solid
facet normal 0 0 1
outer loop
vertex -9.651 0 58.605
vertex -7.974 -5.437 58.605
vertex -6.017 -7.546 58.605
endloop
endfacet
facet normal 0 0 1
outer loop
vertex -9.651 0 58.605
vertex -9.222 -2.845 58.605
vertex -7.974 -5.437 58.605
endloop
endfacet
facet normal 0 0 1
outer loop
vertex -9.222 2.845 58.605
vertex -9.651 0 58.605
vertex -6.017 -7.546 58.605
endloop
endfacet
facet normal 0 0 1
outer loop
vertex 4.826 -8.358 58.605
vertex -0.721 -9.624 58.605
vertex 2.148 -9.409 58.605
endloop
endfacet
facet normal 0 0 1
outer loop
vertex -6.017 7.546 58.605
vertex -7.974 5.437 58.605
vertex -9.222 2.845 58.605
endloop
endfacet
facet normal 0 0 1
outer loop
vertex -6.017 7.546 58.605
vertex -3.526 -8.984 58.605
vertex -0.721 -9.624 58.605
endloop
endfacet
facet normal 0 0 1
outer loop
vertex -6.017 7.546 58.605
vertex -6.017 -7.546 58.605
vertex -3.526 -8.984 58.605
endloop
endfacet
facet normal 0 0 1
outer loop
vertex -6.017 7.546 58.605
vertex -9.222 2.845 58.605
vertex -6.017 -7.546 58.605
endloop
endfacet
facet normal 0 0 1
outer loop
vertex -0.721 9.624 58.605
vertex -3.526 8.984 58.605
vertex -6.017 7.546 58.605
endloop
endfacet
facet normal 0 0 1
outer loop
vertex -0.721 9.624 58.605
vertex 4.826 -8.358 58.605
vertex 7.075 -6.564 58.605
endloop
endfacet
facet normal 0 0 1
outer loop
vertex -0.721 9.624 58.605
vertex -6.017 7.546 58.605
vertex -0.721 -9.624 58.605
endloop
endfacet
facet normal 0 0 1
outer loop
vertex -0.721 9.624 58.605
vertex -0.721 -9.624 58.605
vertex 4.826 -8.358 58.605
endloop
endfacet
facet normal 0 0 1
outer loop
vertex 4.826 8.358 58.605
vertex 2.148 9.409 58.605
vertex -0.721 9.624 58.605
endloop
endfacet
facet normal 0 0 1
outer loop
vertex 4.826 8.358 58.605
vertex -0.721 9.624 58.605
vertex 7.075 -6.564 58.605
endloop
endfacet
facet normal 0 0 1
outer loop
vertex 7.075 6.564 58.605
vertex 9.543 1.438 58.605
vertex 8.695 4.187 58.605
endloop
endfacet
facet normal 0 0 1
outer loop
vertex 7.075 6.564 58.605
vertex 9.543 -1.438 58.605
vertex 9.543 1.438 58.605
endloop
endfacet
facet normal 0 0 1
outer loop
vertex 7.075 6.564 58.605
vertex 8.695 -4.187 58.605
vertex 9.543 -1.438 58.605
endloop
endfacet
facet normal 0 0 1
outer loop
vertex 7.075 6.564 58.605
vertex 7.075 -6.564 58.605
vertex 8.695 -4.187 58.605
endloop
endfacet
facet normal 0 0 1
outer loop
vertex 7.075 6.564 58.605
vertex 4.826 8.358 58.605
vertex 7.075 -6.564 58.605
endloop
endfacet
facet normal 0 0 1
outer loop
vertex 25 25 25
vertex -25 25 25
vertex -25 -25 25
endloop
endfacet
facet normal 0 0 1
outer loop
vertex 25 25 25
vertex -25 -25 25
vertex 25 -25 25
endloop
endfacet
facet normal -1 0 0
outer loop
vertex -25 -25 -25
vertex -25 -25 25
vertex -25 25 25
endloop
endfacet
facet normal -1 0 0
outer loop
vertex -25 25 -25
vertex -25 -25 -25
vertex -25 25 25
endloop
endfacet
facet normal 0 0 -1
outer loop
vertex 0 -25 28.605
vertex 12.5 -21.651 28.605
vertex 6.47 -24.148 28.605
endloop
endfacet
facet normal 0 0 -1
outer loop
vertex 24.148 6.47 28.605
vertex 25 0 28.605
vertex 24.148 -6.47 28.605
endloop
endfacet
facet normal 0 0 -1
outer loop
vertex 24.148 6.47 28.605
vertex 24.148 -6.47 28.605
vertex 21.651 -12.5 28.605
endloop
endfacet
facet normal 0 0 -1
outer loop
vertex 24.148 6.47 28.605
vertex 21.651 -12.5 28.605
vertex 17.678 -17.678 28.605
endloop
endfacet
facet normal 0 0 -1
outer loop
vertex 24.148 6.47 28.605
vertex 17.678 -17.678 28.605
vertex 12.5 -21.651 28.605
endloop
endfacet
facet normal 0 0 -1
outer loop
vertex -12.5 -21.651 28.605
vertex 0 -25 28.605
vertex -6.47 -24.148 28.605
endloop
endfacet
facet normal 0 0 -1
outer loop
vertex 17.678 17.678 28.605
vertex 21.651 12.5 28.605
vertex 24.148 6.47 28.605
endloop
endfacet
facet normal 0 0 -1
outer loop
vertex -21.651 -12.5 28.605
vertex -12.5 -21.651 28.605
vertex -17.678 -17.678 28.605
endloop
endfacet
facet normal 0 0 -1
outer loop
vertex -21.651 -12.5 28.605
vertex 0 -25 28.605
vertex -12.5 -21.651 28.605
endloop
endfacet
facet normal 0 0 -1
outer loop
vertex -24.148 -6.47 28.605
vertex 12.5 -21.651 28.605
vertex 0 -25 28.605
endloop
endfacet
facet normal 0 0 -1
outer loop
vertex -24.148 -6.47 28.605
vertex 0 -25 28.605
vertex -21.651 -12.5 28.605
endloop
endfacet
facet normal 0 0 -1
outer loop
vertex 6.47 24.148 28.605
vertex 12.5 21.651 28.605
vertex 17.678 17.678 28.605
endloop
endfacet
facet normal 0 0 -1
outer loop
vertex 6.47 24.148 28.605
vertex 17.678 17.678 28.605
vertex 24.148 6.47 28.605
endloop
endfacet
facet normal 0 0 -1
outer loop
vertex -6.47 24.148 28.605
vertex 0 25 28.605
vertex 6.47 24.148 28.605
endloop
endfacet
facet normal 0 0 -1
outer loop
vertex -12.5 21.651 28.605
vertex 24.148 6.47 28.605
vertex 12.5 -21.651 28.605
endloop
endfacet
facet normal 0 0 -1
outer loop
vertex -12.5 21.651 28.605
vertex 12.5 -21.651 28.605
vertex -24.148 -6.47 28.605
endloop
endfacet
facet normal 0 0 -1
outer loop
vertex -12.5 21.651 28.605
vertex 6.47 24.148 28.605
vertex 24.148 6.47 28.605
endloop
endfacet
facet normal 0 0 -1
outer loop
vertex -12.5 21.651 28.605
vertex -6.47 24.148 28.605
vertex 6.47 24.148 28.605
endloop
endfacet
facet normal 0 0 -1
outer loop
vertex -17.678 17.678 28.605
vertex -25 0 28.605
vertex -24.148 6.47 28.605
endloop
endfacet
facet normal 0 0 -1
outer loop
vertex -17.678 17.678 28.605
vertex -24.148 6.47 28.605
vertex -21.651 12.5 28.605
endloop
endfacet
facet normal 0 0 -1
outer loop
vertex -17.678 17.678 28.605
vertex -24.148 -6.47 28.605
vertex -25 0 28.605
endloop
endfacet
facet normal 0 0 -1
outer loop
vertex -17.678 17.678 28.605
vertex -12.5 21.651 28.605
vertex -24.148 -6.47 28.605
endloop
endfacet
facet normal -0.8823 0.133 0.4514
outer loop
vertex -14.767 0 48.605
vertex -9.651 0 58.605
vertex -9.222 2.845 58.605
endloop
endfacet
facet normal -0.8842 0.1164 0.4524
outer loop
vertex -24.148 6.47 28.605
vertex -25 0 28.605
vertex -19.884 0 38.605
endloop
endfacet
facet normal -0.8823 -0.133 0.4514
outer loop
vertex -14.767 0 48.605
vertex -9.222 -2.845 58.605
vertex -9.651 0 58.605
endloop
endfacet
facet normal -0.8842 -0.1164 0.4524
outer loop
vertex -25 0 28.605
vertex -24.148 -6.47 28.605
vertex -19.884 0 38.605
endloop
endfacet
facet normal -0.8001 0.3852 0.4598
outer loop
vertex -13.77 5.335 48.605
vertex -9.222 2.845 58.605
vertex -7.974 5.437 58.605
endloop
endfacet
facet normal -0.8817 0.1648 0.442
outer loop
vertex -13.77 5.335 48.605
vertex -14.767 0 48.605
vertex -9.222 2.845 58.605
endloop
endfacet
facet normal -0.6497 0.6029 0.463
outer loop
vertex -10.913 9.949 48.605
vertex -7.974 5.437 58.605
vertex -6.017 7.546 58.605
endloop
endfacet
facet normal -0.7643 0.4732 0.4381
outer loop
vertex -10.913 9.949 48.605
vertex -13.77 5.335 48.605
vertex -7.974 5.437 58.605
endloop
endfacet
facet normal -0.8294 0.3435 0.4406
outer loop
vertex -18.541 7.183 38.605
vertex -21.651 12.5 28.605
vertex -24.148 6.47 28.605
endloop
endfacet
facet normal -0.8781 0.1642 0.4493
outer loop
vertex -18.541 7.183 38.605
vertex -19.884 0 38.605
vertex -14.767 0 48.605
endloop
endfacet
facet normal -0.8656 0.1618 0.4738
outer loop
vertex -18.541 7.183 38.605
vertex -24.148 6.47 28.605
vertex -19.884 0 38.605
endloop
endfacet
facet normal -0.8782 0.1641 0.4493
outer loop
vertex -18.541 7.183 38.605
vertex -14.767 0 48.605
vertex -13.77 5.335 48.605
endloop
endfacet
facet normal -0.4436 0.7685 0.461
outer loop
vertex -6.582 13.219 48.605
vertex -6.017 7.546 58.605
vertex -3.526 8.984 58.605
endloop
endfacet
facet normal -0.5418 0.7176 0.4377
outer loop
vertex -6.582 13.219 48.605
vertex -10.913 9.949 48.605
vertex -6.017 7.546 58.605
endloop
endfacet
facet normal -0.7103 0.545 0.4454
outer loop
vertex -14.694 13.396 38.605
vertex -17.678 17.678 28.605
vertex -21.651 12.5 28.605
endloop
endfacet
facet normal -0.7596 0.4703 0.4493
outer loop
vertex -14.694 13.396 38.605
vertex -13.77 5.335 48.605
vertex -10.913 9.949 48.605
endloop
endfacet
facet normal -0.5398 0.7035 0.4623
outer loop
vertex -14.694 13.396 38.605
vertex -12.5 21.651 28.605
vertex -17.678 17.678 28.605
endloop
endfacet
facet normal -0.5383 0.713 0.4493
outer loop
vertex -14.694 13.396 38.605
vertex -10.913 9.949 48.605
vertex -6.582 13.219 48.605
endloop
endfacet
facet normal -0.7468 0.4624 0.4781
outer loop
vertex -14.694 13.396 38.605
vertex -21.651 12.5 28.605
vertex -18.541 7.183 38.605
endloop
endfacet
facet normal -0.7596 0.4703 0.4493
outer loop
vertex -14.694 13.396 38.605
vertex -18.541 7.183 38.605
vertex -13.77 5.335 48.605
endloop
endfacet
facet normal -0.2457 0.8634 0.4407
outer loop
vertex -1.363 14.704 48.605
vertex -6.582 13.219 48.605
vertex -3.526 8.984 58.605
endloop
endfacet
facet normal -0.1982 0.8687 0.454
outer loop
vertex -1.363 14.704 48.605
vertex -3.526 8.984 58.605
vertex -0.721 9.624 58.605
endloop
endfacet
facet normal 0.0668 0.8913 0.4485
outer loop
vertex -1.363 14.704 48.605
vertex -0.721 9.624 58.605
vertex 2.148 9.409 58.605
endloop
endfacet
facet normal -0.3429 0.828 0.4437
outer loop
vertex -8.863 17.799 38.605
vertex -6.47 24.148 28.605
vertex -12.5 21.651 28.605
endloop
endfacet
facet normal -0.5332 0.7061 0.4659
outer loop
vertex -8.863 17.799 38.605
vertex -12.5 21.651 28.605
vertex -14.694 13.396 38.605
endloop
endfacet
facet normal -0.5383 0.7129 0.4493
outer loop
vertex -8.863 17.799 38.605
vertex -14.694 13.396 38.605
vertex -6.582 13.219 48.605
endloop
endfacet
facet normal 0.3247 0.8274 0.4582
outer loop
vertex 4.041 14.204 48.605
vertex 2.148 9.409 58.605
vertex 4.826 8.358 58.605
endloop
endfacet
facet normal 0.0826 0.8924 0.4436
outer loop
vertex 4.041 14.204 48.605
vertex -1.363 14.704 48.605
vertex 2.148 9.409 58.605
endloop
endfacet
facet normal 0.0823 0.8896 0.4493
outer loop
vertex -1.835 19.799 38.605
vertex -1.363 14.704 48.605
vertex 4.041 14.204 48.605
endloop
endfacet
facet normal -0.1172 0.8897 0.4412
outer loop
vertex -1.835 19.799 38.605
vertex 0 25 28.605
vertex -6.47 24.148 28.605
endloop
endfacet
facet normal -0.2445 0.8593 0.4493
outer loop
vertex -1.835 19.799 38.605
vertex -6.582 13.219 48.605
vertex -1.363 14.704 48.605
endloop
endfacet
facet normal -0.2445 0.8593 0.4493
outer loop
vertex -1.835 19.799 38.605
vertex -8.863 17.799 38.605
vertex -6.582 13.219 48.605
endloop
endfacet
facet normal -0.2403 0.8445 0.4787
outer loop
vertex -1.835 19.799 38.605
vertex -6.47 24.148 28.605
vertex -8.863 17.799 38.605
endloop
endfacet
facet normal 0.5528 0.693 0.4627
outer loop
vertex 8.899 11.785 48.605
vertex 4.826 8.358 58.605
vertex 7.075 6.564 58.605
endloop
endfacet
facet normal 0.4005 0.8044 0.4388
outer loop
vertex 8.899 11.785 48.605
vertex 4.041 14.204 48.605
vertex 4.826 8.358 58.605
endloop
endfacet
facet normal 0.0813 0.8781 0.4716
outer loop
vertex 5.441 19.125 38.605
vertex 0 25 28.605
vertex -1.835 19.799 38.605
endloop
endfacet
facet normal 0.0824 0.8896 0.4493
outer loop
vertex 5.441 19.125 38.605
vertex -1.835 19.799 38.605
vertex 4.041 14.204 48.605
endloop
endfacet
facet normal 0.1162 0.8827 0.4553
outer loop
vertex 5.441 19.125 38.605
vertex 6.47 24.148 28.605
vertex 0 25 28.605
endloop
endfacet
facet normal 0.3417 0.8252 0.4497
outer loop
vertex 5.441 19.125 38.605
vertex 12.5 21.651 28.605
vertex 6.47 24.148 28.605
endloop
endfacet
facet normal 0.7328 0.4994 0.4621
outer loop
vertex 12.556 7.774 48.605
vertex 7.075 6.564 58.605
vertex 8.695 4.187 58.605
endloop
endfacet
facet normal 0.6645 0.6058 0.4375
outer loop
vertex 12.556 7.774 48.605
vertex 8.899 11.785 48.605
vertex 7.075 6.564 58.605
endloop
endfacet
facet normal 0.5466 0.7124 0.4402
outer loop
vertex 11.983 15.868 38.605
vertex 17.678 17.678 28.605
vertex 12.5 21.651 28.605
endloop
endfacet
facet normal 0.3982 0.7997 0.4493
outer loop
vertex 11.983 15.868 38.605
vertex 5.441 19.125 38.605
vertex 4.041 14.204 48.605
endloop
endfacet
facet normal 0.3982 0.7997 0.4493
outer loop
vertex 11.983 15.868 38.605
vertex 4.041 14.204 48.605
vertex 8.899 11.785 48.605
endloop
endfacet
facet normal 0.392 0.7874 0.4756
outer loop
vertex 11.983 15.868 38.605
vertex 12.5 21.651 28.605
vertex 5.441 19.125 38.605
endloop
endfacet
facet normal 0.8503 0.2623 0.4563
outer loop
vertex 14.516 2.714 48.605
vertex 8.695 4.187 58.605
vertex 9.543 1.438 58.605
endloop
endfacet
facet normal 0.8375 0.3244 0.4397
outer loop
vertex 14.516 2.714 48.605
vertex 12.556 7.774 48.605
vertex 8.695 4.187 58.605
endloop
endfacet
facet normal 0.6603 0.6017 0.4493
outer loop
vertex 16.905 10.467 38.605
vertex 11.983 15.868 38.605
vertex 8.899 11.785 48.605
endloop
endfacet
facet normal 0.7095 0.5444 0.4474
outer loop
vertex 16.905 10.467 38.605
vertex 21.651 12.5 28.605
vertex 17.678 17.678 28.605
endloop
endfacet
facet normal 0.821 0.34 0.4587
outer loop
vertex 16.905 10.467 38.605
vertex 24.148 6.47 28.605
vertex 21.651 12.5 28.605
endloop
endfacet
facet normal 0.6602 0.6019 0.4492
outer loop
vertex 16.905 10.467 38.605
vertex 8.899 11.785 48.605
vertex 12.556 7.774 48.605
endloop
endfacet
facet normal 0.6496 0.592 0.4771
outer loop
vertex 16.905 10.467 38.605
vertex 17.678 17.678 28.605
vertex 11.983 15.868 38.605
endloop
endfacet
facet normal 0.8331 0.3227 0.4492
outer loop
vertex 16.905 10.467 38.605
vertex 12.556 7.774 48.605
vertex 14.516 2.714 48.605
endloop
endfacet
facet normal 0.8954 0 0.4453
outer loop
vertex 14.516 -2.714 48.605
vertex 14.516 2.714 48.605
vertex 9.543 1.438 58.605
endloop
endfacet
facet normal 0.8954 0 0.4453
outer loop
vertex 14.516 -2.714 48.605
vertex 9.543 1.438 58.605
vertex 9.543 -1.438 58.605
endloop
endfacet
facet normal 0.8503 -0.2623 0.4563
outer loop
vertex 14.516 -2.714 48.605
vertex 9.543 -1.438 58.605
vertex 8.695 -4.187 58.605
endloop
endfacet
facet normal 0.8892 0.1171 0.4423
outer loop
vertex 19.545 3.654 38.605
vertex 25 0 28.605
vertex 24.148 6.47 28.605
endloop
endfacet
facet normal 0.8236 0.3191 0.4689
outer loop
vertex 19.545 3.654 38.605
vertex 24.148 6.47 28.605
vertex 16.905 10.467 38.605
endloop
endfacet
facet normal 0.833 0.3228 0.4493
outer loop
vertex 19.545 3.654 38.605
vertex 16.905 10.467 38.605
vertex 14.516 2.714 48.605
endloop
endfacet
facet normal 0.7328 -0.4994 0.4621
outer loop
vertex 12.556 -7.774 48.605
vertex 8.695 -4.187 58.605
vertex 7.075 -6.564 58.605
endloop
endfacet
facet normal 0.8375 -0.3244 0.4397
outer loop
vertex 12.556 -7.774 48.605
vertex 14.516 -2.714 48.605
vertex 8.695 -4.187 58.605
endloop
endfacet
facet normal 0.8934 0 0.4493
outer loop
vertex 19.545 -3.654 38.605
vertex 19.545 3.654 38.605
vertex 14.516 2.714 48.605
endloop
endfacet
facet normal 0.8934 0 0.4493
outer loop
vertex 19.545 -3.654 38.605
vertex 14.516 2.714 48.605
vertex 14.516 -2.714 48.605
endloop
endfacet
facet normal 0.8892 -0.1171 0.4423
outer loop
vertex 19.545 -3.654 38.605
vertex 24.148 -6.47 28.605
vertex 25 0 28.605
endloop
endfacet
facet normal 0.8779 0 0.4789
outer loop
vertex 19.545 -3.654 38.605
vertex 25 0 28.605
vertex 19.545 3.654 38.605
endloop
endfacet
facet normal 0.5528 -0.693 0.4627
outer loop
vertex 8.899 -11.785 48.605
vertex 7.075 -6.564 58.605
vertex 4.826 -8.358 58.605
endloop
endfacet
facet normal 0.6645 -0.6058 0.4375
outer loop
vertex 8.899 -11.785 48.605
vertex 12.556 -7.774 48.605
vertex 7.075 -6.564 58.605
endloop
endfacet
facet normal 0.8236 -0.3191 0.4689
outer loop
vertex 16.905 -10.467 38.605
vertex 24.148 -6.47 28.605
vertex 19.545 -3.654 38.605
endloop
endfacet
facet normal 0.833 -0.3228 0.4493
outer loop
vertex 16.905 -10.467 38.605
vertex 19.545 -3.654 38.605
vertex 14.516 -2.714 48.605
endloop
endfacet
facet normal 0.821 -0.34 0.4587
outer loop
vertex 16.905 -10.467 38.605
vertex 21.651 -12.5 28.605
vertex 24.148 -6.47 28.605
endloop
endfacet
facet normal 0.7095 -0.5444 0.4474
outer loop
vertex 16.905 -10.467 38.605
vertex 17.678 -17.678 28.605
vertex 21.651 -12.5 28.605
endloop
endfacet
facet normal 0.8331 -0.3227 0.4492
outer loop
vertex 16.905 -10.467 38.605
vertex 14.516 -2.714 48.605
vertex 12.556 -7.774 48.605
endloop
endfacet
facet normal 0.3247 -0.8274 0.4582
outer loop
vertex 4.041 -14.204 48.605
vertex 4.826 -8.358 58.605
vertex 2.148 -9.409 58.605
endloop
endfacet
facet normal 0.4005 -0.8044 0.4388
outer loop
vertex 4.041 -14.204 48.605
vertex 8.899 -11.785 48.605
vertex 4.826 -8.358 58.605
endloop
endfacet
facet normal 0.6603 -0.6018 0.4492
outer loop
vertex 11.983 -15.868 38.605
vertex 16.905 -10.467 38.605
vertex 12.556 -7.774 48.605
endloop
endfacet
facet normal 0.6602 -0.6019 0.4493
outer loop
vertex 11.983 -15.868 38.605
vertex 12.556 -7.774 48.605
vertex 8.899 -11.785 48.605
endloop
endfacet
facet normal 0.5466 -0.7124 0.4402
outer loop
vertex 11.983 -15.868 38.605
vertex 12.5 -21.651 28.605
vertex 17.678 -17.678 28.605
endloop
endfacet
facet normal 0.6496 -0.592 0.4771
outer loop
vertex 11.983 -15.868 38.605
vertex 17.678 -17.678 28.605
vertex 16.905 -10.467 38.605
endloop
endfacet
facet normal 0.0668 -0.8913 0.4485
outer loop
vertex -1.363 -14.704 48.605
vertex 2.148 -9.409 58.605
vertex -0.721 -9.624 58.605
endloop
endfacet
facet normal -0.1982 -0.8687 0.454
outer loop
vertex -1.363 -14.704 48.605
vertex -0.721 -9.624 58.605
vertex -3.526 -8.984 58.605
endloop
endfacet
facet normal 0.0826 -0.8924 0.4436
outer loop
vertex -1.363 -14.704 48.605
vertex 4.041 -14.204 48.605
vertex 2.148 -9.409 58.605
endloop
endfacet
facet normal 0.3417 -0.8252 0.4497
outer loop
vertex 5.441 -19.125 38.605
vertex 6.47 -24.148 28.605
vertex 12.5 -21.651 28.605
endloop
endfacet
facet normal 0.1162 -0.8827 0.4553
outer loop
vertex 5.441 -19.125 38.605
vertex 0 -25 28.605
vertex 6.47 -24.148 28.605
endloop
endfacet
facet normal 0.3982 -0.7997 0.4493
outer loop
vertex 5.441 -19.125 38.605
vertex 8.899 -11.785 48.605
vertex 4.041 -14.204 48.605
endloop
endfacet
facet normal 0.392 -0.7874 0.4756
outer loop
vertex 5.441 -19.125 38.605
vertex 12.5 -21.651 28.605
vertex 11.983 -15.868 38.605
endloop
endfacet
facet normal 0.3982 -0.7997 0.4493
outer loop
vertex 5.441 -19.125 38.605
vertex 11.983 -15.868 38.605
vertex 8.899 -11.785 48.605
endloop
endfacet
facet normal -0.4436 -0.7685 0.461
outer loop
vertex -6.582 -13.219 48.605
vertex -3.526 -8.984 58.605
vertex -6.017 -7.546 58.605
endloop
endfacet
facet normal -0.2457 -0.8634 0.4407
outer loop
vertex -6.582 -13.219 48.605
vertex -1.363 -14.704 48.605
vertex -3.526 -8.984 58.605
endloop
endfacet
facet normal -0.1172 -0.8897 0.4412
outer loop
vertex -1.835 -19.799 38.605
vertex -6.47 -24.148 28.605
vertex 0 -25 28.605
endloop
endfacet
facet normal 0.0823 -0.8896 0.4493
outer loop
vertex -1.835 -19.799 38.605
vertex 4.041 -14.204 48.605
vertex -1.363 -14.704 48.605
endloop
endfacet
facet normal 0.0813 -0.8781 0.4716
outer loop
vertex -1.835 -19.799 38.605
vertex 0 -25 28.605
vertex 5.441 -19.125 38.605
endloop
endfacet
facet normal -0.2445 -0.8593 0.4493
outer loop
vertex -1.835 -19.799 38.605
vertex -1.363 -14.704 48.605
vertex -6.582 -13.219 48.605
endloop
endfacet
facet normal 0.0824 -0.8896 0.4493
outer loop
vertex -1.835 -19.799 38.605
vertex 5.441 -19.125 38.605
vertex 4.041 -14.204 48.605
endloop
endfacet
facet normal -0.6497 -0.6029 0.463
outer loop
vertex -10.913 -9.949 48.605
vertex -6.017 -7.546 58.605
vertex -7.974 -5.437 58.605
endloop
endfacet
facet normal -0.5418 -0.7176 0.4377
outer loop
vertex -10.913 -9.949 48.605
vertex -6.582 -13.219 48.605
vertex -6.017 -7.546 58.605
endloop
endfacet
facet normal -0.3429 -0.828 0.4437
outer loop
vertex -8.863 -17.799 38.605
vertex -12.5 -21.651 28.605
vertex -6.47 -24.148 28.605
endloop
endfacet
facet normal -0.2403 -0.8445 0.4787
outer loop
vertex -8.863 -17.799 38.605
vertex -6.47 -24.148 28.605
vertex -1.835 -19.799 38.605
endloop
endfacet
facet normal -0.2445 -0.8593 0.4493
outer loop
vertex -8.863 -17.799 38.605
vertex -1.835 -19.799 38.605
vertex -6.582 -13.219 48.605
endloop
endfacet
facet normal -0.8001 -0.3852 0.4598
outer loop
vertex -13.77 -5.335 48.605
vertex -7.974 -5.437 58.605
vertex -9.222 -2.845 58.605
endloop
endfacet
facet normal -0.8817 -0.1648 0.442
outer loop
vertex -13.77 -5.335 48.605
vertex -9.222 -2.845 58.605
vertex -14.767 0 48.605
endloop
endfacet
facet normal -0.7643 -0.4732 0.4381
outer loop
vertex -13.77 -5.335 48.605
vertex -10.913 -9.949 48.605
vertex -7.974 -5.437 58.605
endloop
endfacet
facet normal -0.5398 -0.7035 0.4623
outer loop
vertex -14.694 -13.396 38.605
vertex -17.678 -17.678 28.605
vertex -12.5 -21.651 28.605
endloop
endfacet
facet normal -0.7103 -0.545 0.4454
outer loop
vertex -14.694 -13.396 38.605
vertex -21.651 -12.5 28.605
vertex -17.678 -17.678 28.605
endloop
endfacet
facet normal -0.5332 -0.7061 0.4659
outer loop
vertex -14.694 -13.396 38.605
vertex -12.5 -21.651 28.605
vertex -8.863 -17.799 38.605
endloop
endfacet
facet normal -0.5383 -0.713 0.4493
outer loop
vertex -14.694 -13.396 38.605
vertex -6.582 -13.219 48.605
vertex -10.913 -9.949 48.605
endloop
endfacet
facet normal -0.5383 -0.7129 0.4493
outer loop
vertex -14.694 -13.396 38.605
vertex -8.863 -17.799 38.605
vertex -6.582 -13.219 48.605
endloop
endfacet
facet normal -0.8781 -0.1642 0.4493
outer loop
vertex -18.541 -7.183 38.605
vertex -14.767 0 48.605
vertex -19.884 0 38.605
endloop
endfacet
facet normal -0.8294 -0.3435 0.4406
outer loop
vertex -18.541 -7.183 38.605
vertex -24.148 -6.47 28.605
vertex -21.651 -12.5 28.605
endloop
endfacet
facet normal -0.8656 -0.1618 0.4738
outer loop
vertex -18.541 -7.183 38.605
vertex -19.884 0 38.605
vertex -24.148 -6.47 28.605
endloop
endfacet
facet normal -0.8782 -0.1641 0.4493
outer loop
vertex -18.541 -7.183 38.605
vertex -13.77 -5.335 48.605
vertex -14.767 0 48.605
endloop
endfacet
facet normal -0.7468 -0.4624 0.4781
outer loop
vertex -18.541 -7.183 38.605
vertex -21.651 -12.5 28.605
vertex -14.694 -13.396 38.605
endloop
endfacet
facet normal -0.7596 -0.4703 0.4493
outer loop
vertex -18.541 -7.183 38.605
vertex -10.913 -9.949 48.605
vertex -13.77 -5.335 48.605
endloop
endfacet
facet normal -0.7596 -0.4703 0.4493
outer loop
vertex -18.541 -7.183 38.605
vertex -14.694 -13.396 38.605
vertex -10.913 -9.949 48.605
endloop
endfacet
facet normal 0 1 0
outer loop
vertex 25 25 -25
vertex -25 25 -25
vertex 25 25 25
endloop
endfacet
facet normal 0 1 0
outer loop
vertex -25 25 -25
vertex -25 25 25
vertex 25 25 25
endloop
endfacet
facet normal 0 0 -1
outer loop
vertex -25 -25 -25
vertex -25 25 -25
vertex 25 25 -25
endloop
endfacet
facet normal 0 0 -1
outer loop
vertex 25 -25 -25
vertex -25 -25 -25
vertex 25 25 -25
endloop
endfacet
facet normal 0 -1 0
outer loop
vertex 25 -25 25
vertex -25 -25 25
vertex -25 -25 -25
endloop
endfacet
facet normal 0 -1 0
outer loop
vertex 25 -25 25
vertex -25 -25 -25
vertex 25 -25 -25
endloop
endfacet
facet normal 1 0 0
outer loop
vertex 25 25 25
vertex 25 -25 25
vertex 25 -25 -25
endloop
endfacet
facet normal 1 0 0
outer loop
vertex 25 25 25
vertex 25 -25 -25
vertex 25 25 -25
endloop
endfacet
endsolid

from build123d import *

# Parameters (mm, degrees)
F0_W     = 50
F0_H     = 50
F1_DEPTH = 25


with BuildPart() as f1:
    # F0 (on Top) → F1 (new body, symmetric)
    with BuildSketch(Plane.XY):
        Rectangle(F0_W, F0_H)
    extrude(amount=F1_DEPTH, both=True)


with BuildPart() as f4:
    # F3 (on Front) → F4 (revolve)
    with BuildSketch(Plane.XZ):
        Polygon((0, 28.604654), (0, 58.604654), (-9.651164, 58.604654), (-25, 28.604654), align=None)
    revolve(axis=Axis((0, 0, 19.298827), (0, 0, -1)))


solid = Compound([f1.part, f4.part])
